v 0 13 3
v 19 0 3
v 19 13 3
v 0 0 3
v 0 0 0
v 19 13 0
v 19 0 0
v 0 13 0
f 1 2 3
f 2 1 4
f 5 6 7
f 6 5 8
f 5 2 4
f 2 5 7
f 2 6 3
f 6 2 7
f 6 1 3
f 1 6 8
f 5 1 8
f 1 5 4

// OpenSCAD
// Generated by SolidPython 1.0.1 on 2020-07-29 00:46:56


cube(size = [19, 13, 3]);
/***********************************************
*********      SolidPython code:      **********
************************************************
 
# import packages: SolidPython
from solid import *
from solid.utils import *
from itertools import chain, combinations, permutations


class Resize:

    def __init__(self, scad_file):
        self.scad_file = scad_file
        #self.scad_file = import_scad(scad_file)
        # cone/cylinder param:
        self.r1 = 0
        self.r2 = 0
        self.h = 0
        # rectangular prism param:
        self.w = 0
        self.l = 0
        # ellipse param:
        self.r = 0

    # import OpenScad code (file name corresponds to shape)


    # classify shape + parameters
    def assign(self, param1, param2, param3):
        if self.scad_file == 'cone.scad':
            self.r1 = param1
            self.r2 = param2
            self.h = param3
        elif self.scad_file == 'cylinder.scad':
            self.r1 = param1
            self.r2 = param2
            self.h = param3
        elif self.scad_file == 'rectangularPrism.scad':
            self.h = param1
            self.l = param2
            self.w = param3
        else:
            self.r = param1
            self.h = param2

    # resize parameters
    def iterate(self):
        x = range(3, 20, 2)
        i = 1
        if self.scad_file == 'cone.scad':
            tempList = list(permutations(x, 2))
            for temp in tempList:
                param1 = temp[0]
                param2 = temp[1]
                filepath = 'produced_scad_files/' + 'cone' + str(param1) + '_' + str(param2) + '_' + '.scad'
                scad_render_to_file(cylinder(h=param1, r1=param2, r2=0), filepath)

        elif self.scad_file == 'cylinder.scad':
            tempList = list(permutations(x, 3))
            for temp in tempList:
                param1 = temp[0]
                param2 = temp[1]
                filepath = 'produced_scad_files/' + 'cylinder' + str(param1) + '_' + str(param2) + '_' + '.scad'
                scad_render_to_file(cylinder(h=param1, r1=param2, r2=param2), filepath)

        elif self.scad_file == 'rectangularPrism.scad':
            tempList = list(permutations(x, 3))
            for temp in tempList:
                param1 = temp[0]
                param2 = temp[1]
                param3 = temp[2]
                filepath = 'produced_scad_files/' + 'rectangularPrism' + str(param1) + '_' + str(param2) + '_' + str(
                    param3) + '.scad'
                scad_render_to_file(cube(size=(param1, param2, param3)), filepath)

        elif self.scad_file == 'ellipse.scad':
            tempList = list(permutations(x, 4))
            for temp in tempList:
                param1 = temp[0]
                param2 = temp[1]
                param3 = temp[2]
                param4 = temp[3]
                filepath = 'produced_scad_files/' + 'ellipse' + str(param1) + '_' + str(param2) + '_' + str(param3) + '_' + str(param4) + '.scad'
                scad_render_to_file(scale([param1, param2, param3])(sphere(r=param4)), filepath)

    def render_to_scadfile(self):
        scad_render_to_file(scad, 'example.scad') 
 
************************************************/
